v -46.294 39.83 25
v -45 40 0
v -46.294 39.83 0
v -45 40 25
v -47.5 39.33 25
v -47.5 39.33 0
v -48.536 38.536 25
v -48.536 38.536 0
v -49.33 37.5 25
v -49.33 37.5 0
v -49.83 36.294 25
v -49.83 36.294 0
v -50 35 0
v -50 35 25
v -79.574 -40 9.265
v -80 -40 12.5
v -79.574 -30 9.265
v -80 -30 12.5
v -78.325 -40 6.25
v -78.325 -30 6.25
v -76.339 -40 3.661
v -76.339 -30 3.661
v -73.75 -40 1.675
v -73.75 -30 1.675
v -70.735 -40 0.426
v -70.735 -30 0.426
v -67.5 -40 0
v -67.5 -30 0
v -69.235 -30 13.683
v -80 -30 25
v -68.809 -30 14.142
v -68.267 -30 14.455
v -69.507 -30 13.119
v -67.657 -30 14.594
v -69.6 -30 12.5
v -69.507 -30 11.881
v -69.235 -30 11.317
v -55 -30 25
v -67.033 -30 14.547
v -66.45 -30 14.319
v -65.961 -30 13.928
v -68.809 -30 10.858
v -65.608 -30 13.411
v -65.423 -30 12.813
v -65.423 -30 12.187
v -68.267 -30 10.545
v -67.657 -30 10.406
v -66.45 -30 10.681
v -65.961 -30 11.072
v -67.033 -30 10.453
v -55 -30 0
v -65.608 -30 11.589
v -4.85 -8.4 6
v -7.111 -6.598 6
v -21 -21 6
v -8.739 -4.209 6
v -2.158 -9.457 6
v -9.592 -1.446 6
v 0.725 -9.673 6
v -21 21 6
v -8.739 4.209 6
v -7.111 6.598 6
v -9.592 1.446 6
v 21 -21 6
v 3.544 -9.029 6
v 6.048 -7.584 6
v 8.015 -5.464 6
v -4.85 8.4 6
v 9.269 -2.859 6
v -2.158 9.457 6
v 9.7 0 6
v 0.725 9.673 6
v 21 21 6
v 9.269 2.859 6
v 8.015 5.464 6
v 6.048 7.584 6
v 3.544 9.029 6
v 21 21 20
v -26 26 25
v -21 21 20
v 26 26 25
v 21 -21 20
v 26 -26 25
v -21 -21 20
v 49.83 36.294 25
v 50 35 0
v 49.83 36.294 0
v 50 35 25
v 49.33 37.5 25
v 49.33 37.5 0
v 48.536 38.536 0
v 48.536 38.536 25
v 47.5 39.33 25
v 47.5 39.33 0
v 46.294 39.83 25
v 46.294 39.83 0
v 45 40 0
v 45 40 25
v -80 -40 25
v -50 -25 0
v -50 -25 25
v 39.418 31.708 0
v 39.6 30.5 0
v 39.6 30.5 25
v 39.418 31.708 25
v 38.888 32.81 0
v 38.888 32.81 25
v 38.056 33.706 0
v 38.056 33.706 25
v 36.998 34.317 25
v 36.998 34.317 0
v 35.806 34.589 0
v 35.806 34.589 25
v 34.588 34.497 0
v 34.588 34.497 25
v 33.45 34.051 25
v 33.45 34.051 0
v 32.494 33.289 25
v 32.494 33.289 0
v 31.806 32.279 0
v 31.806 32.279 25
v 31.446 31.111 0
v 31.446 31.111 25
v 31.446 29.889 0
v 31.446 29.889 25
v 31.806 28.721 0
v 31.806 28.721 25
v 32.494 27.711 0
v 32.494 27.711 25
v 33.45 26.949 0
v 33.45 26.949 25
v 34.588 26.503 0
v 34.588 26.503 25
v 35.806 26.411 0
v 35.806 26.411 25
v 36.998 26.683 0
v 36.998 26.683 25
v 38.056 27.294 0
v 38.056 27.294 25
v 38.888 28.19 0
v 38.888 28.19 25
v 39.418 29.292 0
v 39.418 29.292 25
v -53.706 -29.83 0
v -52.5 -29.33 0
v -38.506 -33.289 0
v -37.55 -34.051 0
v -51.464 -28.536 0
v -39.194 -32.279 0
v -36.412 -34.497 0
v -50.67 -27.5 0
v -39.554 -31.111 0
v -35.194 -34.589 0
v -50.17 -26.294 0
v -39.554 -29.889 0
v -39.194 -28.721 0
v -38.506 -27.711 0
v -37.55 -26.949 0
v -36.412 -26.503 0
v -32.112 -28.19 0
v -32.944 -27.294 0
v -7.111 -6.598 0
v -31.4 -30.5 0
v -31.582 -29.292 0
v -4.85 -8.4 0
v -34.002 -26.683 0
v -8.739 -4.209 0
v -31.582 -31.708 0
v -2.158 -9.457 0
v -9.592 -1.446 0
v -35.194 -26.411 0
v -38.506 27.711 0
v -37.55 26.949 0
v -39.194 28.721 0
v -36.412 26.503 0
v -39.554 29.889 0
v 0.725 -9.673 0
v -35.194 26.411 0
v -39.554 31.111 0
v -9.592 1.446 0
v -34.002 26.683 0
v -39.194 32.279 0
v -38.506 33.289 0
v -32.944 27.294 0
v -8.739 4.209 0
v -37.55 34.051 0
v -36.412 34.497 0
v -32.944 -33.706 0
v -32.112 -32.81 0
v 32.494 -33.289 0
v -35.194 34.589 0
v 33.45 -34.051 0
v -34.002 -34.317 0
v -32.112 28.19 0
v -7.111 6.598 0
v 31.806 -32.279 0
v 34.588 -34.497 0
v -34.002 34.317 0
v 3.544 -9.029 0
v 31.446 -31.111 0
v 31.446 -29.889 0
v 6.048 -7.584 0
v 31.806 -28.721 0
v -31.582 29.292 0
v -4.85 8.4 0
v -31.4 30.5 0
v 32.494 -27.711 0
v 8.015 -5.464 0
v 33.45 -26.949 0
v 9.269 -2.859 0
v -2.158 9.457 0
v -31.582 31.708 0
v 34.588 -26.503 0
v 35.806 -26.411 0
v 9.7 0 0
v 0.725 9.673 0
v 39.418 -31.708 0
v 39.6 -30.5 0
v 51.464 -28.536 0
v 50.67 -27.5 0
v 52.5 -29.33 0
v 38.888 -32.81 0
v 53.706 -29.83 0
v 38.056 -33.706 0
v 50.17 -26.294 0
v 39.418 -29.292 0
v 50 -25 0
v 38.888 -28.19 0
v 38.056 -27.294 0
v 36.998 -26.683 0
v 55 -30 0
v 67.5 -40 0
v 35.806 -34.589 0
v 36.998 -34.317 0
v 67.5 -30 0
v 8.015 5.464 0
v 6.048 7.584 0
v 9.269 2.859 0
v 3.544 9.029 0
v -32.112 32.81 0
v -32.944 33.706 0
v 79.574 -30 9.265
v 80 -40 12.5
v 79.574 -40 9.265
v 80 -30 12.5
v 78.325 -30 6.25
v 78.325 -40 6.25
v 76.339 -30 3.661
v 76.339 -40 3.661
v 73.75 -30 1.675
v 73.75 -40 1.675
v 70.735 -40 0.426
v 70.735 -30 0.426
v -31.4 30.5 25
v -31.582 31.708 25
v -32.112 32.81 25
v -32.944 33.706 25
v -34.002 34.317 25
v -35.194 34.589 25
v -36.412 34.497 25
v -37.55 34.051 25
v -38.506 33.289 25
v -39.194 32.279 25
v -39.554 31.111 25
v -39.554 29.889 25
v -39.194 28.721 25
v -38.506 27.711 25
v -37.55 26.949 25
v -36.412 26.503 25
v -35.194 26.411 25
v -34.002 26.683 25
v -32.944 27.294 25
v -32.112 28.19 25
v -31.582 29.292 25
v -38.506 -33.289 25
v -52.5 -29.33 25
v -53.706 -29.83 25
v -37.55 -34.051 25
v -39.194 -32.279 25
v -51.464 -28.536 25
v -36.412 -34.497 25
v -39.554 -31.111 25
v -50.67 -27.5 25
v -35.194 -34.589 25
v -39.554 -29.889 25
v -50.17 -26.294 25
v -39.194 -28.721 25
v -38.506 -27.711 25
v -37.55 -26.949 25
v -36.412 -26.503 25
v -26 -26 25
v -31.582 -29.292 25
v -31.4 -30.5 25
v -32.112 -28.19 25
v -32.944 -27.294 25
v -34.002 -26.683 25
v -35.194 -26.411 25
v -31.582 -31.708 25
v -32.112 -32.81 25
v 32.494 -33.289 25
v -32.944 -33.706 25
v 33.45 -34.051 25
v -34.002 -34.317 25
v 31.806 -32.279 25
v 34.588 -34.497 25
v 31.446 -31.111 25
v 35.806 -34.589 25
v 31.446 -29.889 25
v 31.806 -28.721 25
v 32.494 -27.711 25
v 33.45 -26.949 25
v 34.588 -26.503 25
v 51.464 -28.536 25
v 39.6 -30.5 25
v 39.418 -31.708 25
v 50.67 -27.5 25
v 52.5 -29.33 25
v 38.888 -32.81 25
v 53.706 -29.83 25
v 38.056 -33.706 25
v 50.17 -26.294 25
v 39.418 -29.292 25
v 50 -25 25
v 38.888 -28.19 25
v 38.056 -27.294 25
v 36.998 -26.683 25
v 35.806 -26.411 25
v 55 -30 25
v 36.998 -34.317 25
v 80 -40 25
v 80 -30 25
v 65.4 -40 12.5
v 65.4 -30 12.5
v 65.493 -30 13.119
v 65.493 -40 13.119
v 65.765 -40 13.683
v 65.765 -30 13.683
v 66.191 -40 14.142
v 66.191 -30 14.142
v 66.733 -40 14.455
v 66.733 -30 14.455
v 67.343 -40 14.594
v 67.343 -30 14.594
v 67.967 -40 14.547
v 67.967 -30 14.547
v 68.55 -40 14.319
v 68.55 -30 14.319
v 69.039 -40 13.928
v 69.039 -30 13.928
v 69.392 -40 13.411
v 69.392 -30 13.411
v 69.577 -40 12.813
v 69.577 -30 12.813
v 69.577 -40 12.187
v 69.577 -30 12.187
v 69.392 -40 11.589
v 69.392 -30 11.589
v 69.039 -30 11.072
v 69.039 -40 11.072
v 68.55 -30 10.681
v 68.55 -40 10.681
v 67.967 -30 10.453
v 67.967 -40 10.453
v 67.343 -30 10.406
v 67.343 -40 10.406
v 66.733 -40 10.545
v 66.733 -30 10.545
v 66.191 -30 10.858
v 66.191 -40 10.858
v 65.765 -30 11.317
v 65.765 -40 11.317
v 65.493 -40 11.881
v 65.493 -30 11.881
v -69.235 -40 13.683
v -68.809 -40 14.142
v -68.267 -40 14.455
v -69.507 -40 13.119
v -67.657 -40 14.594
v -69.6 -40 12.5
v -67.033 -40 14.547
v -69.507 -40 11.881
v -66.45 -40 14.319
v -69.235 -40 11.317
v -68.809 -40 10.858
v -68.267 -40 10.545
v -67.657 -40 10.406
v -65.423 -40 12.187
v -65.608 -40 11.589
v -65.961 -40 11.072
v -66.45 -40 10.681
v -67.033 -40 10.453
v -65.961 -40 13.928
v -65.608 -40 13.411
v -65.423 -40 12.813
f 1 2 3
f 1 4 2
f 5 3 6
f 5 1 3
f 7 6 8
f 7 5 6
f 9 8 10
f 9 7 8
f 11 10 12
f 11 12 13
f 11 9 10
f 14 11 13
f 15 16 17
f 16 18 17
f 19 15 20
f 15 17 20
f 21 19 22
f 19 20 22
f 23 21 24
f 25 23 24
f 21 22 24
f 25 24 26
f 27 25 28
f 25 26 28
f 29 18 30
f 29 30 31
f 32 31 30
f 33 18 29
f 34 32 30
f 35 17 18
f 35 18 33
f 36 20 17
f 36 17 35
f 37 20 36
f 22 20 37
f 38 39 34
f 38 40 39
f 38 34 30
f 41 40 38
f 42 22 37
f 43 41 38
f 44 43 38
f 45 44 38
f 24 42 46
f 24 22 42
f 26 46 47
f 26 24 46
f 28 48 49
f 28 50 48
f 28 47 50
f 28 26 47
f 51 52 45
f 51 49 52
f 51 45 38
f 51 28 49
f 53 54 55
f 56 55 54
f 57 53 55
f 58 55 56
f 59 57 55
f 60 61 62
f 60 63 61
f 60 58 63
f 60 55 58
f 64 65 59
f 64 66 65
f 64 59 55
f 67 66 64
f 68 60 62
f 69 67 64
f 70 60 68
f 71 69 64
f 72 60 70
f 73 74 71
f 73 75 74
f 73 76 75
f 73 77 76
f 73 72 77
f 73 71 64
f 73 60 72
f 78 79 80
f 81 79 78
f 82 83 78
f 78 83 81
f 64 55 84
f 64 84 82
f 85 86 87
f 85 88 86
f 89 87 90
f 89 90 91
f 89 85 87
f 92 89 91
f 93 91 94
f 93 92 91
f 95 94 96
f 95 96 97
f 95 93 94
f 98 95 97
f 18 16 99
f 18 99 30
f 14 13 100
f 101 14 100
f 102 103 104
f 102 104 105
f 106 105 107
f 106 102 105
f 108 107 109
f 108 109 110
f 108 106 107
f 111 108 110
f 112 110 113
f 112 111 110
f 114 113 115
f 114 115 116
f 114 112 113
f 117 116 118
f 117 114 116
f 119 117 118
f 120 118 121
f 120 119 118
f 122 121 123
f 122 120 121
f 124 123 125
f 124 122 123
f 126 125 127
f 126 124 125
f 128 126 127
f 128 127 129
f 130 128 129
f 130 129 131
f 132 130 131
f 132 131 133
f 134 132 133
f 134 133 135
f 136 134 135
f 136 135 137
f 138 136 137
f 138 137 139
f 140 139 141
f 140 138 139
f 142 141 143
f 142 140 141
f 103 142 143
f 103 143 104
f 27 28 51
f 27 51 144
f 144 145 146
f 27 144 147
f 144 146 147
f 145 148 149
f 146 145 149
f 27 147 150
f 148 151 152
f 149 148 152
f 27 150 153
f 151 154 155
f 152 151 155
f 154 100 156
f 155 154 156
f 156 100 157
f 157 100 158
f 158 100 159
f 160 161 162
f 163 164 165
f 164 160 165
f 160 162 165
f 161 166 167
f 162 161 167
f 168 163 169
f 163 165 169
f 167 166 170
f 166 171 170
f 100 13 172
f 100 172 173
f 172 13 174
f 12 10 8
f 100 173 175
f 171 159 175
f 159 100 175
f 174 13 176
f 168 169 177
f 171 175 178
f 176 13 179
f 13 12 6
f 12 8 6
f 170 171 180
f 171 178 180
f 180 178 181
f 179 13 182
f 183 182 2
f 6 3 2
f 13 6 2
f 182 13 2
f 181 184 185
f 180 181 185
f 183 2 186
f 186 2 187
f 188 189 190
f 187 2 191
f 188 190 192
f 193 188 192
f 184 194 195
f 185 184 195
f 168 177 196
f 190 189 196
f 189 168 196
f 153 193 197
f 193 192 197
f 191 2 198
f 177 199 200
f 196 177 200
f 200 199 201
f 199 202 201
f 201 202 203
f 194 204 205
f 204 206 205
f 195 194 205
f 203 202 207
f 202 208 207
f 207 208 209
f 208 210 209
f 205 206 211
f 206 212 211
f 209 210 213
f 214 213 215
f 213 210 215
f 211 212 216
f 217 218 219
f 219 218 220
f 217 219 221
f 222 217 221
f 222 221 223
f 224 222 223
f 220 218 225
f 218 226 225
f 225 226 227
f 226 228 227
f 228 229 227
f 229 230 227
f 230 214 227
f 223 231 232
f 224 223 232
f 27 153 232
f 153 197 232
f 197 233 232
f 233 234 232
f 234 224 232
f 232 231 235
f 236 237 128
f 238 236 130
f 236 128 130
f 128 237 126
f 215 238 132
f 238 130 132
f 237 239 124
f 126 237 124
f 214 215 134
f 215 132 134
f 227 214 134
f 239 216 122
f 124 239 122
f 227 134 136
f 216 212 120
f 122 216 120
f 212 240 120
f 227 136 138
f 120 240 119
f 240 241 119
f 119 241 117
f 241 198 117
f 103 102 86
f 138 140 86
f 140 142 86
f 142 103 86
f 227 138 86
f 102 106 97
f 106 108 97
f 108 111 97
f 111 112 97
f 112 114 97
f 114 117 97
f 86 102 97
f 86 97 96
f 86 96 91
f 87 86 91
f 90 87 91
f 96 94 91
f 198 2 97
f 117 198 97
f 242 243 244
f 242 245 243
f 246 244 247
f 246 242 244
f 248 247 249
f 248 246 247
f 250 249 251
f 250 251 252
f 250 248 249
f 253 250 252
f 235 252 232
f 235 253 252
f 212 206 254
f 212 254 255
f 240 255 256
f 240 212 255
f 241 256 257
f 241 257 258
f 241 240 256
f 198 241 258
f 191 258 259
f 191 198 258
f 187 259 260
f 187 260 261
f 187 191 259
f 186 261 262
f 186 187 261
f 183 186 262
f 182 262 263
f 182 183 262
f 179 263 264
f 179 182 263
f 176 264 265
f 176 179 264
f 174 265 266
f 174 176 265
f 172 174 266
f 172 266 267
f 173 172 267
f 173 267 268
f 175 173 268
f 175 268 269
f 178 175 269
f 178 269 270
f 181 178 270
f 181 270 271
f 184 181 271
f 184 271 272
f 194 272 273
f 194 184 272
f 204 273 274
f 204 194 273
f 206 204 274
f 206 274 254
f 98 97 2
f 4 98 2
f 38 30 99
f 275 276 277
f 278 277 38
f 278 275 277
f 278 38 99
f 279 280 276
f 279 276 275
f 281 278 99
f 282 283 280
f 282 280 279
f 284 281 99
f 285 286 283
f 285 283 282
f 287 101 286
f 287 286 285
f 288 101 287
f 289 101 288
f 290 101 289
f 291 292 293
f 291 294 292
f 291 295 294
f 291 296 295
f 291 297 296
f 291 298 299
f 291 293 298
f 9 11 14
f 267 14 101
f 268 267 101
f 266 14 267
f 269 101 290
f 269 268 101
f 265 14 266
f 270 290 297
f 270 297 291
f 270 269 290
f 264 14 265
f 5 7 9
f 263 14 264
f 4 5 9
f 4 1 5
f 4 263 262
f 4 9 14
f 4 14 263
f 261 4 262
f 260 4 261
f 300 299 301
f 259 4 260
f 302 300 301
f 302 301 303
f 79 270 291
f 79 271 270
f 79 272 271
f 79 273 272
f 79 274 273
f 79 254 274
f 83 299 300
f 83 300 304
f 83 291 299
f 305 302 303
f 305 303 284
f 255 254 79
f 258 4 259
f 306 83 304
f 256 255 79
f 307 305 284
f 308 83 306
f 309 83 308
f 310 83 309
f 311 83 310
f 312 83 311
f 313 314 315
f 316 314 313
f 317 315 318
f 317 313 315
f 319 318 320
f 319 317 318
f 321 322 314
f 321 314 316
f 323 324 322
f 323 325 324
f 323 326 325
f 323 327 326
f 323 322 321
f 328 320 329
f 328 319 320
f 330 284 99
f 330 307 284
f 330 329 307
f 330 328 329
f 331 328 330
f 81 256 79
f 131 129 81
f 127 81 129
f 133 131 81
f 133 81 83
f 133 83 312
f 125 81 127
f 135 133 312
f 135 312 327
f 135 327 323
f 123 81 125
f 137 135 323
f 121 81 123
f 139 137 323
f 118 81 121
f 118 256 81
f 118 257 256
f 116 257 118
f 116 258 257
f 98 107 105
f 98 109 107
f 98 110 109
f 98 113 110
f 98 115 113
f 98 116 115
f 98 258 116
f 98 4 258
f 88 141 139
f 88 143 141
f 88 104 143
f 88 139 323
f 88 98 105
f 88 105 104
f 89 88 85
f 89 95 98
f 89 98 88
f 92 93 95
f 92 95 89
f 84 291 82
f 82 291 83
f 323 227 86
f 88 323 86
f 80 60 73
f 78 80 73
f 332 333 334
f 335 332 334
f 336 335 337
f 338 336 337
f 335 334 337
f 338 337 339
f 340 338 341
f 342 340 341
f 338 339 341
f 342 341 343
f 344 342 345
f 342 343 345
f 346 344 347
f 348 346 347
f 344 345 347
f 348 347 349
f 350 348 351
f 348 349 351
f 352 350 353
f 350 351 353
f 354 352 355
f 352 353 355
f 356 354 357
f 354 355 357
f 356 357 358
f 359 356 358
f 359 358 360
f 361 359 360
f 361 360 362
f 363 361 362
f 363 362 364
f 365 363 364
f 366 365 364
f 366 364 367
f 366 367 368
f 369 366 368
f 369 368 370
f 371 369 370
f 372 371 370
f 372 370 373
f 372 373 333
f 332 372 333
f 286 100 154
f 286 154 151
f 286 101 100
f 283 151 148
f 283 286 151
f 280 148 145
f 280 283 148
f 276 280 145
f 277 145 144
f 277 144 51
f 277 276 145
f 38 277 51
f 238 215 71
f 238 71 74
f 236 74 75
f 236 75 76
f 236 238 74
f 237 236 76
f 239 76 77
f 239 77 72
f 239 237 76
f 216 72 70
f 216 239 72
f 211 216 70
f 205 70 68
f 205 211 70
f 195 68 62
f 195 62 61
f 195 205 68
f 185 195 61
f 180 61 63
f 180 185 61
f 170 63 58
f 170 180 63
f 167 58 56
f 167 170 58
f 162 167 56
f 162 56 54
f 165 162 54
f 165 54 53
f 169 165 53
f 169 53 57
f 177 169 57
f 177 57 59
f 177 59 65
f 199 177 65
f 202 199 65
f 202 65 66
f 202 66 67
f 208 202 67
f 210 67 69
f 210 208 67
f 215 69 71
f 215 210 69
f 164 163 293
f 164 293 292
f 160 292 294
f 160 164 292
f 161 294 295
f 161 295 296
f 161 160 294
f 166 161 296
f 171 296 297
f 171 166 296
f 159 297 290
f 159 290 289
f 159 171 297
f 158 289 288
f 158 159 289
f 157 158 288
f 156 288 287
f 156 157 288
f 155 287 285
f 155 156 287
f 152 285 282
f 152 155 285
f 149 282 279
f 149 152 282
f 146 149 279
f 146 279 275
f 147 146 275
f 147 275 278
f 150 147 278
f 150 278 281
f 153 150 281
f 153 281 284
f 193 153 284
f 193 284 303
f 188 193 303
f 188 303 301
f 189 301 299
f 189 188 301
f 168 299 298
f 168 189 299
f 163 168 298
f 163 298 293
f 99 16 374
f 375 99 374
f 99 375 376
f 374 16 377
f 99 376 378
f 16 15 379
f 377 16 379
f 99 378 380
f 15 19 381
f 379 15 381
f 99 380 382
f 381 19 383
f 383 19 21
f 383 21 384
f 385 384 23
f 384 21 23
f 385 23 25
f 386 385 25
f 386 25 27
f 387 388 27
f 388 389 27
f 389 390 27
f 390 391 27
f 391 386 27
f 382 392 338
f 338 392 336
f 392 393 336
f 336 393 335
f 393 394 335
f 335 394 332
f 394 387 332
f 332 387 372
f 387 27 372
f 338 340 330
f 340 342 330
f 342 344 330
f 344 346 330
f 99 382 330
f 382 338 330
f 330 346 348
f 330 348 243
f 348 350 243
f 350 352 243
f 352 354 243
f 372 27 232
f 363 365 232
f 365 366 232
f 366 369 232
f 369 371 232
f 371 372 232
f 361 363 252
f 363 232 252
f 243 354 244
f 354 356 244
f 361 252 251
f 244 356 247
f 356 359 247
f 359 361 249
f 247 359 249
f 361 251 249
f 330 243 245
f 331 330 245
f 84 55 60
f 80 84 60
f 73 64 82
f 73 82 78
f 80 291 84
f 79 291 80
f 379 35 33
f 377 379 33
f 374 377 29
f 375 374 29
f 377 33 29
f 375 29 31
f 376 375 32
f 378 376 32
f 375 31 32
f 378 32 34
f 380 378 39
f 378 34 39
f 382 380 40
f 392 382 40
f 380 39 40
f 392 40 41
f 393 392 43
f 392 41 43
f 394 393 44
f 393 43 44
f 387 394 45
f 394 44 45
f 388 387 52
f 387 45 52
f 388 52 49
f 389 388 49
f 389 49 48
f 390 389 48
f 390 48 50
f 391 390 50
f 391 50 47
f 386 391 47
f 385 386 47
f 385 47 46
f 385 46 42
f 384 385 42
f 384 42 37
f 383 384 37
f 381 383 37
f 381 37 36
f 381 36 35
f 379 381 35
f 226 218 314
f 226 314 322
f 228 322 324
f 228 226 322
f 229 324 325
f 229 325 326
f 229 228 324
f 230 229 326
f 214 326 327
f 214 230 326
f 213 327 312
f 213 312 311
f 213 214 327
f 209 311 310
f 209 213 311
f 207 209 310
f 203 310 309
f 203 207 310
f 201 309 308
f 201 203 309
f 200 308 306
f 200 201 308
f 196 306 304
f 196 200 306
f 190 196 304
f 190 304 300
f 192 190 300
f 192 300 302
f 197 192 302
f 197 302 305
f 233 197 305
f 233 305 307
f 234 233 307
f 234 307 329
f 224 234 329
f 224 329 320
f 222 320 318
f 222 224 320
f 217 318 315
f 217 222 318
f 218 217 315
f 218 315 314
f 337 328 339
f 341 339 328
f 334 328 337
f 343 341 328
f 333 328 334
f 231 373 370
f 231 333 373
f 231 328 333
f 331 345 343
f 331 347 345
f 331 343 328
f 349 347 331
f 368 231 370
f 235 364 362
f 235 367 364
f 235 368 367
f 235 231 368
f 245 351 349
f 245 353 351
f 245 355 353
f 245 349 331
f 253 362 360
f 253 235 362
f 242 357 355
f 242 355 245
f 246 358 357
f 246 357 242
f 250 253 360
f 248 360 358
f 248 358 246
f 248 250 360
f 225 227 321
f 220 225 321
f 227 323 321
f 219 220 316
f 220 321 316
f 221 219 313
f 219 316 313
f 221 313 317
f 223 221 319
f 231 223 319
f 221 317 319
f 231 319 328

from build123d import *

# Parameters (mm, degrees)
F0_R     = 4.1
F0_W     = 42
F0_H     = 42
F0_W_2   = 30
F0_H_2   = 10
F1_DEPTH = 25
F0_R_2   = 9.7
F2_DEPTH = 6
F3_SIZE  = 5
F4_R     = 5
F5_R     = 12.5
F7_R     = 2.1
F6_R     = 2.1
F8_DEPTH = 25


with BuildPart() as f1:
    # F0 (on Top) → F1 (new body)
    with BuildSketch(Plane.XY):
        Polygon((-50, -30), (-50, -40), (50, -40), (50, -30), (50, 40), (-50, 40), align=None)
        with Locations((-35.5, -30.5)):
            Circle(F0_R, mode=Mode.SUBTRACT)
        with Locations((35.5, -30.5)):
            Circle(F0_R, mode=Mode.SUBTRACT)
        with Locations((-35.5, 30.5)):
            Circle(F0_R, mode=Mode.SUBTRACT)
        Rectangle(F0_W, F0_H, mode=Mode.SUBTRACT)
        with Locations((35.5, 30.5)):
            Circle(F0_R, mode=Mode.SUBTRACT)
        with Locations((-65, -35)):
            Rectangle(F0_W_2, F0_H_2)
        with Locations((65, -35)):
            Rectangle(F0_W_2, F0_H_2)
    extrude(amount=F1_DEPTH)

    # F0 (on Top) → F2 (join)
    with BuildSketch(Plane.XY):
        Rectangle(F0_W, F0_H)
        Circle(F0_R_2, mode=Mode.SUBTRACT)
    extrude(amount=F2_DEPTH)

    # F3
    f3_edges = [f1.edges().sort_by_distance(p)[0] for p in [
        (0, 21, 25),
        (-21, 0, 25),
        (0, -21, 25),
        (21, 0, 25),
    ]]
    chamfer(f3_edges, length=F3_SIZE)

    # F4
    f4_edges = [f1.edges().sort_by_distance(p)[0] for p in [
        (-50, -30, 12.5),
        (-50, 40, 12.5),
        (50, 40, 12.5),
        (50, -30, 12.5),
    ]]
    fillet(f4_edges, radius=F4_R)

    # F5
    f5_edges = [f1.edges().sort_by_distance(p)[0] for p in [
        (80, -35, 0),
        (-80, -35, 0),
    ]]
    fillet(f5_edges, radius=F5_R)

    # F7 (on face) + F6 (on face) → F8 (cut)
    with BuildSketch(Plane(origin=(0, -30, 0), x_dir=(-1, 0, 0), z_dir=(0, 1, 0))):
        with Locations((-67.5, 12.5)):
            Circle(F7_R)
    with BuildSketch(Plane(origin=(0, -30, 0), x_dir=(-1, 0, 0), z_dir=(0, 1, 0))):
        with Locations((67.5, 12.5)):
            Circle(F6_R)
    extrude(amount=-F8_DEPTH, mode=Mode.SUBTRACT)


solid = f1.part
